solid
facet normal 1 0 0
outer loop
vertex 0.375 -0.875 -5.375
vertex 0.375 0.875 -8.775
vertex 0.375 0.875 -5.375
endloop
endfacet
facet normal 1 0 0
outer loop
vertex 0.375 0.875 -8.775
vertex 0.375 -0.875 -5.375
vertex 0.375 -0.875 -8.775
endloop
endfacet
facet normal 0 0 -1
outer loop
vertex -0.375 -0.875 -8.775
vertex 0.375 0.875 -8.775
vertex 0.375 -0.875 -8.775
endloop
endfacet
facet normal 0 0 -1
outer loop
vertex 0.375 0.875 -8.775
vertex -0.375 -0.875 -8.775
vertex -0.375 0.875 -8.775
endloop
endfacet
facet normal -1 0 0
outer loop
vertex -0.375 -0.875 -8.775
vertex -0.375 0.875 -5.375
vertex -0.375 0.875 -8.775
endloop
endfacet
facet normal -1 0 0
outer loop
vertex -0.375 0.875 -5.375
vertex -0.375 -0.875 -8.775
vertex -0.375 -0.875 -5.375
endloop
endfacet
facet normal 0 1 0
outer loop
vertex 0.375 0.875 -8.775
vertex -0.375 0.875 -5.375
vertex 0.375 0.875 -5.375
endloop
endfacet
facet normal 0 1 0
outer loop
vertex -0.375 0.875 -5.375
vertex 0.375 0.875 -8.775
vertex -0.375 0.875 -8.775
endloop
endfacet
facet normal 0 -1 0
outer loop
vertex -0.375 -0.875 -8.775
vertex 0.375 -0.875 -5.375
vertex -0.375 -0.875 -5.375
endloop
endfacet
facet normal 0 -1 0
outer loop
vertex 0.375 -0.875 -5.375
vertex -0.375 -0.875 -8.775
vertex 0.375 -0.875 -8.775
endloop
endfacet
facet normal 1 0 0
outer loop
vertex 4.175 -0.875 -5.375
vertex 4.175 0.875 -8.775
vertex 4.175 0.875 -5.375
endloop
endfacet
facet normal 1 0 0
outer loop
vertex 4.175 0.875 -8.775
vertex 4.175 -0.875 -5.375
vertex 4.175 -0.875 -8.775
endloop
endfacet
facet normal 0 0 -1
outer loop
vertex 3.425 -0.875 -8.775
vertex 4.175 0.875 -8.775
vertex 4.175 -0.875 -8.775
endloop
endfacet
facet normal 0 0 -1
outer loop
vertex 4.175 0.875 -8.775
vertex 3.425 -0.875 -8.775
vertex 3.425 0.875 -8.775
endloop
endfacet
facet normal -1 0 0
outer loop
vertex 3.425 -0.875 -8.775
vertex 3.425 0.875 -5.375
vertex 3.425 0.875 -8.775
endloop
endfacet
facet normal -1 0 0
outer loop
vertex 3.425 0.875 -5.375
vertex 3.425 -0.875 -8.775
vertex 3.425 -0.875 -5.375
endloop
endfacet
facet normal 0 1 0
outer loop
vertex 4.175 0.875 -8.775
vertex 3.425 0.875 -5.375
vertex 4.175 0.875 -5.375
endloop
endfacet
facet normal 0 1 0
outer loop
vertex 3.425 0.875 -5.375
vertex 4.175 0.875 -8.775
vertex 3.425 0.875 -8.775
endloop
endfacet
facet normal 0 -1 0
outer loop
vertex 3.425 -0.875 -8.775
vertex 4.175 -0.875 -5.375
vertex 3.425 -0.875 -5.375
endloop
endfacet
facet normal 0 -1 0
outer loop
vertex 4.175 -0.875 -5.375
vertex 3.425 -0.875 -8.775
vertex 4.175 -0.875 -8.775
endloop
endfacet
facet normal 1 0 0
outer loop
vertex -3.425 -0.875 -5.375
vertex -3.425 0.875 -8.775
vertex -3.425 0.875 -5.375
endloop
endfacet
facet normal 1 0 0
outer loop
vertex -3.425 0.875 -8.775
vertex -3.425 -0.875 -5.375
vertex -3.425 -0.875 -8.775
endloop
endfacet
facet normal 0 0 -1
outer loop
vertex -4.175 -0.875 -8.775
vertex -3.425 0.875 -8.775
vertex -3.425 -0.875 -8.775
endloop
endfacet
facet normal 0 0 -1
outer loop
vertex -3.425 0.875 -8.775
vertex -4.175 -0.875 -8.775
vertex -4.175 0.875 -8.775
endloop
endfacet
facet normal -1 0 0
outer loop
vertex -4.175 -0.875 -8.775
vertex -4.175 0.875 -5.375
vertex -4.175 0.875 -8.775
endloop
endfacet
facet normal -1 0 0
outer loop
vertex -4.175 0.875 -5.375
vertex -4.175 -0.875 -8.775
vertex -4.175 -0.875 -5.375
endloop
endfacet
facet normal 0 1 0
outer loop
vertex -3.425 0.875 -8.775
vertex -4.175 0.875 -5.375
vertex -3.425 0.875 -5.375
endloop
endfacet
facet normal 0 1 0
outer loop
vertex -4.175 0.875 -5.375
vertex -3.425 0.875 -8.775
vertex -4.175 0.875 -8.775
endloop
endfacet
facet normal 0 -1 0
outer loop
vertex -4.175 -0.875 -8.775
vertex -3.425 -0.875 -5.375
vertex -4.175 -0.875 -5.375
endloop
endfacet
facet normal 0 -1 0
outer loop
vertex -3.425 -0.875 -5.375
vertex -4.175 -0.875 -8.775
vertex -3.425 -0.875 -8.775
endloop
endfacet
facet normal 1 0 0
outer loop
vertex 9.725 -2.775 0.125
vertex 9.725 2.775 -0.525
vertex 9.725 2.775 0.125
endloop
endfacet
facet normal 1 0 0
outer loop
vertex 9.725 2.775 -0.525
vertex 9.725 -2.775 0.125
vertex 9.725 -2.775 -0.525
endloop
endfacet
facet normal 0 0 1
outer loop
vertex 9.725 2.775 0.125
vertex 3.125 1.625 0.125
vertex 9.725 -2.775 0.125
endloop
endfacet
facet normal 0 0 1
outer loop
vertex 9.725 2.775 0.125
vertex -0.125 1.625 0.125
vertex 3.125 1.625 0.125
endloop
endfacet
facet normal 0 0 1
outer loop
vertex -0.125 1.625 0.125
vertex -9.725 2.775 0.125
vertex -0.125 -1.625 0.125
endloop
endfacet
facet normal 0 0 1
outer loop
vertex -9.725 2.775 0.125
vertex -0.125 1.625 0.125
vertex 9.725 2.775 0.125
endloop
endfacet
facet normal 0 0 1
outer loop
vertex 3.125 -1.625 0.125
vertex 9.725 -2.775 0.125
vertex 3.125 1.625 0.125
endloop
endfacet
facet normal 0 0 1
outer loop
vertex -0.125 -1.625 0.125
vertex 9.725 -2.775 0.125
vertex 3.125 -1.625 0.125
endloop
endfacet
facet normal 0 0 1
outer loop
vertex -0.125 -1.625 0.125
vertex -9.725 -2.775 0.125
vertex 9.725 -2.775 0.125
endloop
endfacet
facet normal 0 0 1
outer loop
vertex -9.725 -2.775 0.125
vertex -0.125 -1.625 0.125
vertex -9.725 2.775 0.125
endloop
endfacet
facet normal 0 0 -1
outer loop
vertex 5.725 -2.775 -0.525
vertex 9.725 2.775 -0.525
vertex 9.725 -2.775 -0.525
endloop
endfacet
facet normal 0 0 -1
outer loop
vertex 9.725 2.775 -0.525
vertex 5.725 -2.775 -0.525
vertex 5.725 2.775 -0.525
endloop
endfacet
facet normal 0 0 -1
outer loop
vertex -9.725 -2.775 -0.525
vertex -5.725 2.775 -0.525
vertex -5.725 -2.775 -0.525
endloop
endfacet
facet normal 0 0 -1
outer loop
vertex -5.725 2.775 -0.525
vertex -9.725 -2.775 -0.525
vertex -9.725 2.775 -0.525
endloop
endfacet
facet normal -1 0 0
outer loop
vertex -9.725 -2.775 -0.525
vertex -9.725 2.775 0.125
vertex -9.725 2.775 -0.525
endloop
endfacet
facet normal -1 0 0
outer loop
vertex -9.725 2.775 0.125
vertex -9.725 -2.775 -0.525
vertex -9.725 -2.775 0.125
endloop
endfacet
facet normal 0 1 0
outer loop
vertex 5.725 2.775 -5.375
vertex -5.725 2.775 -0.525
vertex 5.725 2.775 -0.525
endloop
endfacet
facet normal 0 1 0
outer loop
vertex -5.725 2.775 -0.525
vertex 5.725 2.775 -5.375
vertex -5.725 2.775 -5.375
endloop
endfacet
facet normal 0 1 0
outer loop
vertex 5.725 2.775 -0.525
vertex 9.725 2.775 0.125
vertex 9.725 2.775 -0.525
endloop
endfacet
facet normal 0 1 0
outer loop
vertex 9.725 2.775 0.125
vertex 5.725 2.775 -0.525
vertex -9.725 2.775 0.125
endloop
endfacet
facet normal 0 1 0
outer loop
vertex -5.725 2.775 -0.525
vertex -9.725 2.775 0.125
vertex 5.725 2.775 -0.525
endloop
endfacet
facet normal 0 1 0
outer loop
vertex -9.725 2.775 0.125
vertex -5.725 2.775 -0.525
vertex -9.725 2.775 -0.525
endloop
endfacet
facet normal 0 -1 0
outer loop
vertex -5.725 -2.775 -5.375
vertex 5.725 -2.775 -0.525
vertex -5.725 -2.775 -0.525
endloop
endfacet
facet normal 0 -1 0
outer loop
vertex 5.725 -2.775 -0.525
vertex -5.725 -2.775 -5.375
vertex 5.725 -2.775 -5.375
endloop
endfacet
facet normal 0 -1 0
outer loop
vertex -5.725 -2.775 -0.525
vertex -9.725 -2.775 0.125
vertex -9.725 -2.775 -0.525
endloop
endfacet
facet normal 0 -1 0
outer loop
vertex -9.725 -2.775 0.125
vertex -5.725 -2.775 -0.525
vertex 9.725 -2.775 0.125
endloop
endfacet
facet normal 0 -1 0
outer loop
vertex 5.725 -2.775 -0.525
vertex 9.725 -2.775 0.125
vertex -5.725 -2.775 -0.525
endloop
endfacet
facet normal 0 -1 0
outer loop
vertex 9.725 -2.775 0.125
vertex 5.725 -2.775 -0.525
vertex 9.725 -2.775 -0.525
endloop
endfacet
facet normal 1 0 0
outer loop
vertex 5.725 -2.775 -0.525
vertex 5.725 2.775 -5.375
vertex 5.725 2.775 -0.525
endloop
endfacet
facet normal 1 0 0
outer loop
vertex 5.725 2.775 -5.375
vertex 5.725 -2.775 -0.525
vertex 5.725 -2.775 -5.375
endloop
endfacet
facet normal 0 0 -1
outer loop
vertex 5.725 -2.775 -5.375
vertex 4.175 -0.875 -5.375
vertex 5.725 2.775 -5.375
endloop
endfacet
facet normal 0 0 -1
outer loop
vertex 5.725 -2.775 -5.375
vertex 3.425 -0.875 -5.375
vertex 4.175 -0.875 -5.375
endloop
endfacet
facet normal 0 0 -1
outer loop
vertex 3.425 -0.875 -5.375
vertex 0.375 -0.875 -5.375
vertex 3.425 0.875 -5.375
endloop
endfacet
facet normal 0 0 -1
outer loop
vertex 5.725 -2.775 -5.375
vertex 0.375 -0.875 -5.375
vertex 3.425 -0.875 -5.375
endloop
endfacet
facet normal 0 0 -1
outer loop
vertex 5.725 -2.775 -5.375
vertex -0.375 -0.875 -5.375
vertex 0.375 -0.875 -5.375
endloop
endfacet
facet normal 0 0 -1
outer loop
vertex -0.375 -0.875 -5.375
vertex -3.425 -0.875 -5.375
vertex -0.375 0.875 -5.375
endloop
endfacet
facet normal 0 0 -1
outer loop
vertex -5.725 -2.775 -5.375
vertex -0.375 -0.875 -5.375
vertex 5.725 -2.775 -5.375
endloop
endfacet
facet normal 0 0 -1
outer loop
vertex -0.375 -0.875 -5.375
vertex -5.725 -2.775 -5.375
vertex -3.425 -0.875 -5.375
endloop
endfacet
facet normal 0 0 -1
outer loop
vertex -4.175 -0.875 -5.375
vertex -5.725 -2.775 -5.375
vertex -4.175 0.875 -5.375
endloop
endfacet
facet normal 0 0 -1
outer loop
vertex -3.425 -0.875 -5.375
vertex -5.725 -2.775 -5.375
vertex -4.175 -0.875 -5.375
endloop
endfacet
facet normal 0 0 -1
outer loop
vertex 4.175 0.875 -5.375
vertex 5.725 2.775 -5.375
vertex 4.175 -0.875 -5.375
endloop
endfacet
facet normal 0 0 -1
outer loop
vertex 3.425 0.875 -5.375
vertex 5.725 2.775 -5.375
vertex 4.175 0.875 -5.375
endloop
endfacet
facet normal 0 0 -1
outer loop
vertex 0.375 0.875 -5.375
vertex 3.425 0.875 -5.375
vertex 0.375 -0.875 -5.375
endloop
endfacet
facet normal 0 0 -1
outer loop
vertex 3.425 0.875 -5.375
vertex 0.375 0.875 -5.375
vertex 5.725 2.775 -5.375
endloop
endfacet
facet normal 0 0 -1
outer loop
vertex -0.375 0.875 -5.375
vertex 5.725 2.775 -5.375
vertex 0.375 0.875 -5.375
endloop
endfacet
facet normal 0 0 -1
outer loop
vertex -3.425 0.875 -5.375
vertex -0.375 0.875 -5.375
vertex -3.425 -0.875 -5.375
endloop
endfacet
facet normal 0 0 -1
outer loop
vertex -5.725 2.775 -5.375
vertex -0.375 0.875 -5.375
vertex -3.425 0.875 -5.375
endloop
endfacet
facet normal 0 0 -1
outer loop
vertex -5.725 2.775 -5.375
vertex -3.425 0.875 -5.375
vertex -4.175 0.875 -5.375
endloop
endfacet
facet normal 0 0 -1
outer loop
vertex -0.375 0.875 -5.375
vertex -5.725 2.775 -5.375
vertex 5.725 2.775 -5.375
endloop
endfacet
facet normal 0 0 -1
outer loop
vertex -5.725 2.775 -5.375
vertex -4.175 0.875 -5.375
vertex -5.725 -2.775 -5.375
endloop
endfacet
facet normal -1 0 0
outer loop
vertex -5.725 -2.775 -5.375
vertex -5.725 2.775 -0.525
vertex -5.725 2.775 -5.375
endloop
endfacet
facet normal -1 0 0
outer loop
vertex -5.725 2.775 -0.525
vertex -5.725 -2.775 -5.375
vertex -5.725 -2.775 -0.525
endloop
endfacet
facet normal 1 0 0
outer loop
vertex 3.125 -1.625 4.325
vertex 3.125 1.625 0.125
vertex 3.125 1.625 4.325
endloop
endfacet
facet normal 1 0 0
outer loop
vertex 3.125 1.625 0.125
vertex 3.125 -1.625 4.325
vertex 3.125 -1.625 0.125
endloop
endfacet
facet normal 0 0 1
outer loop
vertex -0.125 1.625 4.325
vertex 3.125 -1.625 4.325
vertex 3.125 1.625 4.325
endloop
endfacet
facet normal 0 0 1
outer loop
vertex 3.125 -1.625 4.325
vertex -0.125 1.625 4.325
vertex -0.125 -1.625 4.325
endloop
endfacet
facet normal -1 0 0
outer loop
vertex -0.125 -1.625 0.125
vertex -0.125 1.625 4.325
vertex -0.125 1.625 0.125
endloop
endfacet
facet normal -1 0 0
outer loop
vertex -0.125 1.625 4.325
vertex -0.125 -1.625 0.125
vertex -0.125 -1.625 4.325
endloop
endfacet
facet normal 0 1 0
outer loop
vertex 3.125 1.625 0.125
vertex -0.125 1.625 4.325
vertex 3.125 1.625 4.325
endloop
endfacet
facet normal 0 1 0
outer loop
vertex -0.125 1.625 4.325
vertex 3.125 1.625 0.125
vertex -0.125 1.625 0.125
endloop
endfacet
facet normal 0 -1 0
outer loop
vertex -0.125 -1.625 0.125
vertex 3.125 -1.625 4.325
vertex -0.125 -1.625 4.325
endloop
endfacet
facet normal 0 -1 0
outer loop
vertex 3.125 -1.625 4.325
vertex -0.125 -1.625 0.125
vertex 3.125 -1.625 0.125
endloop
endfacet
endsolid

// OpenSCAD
//=================================================================================
// switch4.scad
// Small slide switch on Poi
//
// Dr Tom Flint, 15 June 2023
//=================================================================================

//-------------------------------------------------------
module switch4(pos=1,holes=1,tol=0){

  // body
  if(holes>0){
    difference(){
      translate([0,0,-0.2])
      cube([19.2+tol,5.3+tol,0.4+tol],center=true);
      translate([7.3,0,0])
      cylinder(r=1,h=3,center=true,$fn=22);
      translate([-7.3,0,0])
      cylinder(r=1,h=3,center=true,$fn=22);
    }
  }else{
    translate([0,0,-0.2])
    cube([19.2+tol,5.3+tol,0.4+tol],center=true);
  }
  translate([0,0,-0.4-4.85/2])
  cube([11.2+tol,5.3+tol,4.85+tol],center=true);

  // wiring tabs
  color("red")
  translate([0,0,-5.25]){
    translate([0,0,-3.4/2])
    cube([0.5+tol,1.5+tol,3.4+tol],center=true);
    translate([3.8,0,-3.4/2])
    cube([0.5+tol,1.5+tol,3.4+tol],center=true);
    translate([-3.8,0,-3.4/2])
    cube([0.5+tol,1.5+tol,3.4+tol],center=true);
    
  }

  if(pos>0){
    translate([1.5,0,4.2/2])
    cube([3+tol,3+tol,4.2+tol],center=true);
  }else{
    translate([-1.5,0,4.2/2])
    cube([3+tol,3+tol,4.2+tol],center=true);
  }
}

//==================================================================================


switch4(pos=1,holes=0,tol=0.25);


//==================================================================================
